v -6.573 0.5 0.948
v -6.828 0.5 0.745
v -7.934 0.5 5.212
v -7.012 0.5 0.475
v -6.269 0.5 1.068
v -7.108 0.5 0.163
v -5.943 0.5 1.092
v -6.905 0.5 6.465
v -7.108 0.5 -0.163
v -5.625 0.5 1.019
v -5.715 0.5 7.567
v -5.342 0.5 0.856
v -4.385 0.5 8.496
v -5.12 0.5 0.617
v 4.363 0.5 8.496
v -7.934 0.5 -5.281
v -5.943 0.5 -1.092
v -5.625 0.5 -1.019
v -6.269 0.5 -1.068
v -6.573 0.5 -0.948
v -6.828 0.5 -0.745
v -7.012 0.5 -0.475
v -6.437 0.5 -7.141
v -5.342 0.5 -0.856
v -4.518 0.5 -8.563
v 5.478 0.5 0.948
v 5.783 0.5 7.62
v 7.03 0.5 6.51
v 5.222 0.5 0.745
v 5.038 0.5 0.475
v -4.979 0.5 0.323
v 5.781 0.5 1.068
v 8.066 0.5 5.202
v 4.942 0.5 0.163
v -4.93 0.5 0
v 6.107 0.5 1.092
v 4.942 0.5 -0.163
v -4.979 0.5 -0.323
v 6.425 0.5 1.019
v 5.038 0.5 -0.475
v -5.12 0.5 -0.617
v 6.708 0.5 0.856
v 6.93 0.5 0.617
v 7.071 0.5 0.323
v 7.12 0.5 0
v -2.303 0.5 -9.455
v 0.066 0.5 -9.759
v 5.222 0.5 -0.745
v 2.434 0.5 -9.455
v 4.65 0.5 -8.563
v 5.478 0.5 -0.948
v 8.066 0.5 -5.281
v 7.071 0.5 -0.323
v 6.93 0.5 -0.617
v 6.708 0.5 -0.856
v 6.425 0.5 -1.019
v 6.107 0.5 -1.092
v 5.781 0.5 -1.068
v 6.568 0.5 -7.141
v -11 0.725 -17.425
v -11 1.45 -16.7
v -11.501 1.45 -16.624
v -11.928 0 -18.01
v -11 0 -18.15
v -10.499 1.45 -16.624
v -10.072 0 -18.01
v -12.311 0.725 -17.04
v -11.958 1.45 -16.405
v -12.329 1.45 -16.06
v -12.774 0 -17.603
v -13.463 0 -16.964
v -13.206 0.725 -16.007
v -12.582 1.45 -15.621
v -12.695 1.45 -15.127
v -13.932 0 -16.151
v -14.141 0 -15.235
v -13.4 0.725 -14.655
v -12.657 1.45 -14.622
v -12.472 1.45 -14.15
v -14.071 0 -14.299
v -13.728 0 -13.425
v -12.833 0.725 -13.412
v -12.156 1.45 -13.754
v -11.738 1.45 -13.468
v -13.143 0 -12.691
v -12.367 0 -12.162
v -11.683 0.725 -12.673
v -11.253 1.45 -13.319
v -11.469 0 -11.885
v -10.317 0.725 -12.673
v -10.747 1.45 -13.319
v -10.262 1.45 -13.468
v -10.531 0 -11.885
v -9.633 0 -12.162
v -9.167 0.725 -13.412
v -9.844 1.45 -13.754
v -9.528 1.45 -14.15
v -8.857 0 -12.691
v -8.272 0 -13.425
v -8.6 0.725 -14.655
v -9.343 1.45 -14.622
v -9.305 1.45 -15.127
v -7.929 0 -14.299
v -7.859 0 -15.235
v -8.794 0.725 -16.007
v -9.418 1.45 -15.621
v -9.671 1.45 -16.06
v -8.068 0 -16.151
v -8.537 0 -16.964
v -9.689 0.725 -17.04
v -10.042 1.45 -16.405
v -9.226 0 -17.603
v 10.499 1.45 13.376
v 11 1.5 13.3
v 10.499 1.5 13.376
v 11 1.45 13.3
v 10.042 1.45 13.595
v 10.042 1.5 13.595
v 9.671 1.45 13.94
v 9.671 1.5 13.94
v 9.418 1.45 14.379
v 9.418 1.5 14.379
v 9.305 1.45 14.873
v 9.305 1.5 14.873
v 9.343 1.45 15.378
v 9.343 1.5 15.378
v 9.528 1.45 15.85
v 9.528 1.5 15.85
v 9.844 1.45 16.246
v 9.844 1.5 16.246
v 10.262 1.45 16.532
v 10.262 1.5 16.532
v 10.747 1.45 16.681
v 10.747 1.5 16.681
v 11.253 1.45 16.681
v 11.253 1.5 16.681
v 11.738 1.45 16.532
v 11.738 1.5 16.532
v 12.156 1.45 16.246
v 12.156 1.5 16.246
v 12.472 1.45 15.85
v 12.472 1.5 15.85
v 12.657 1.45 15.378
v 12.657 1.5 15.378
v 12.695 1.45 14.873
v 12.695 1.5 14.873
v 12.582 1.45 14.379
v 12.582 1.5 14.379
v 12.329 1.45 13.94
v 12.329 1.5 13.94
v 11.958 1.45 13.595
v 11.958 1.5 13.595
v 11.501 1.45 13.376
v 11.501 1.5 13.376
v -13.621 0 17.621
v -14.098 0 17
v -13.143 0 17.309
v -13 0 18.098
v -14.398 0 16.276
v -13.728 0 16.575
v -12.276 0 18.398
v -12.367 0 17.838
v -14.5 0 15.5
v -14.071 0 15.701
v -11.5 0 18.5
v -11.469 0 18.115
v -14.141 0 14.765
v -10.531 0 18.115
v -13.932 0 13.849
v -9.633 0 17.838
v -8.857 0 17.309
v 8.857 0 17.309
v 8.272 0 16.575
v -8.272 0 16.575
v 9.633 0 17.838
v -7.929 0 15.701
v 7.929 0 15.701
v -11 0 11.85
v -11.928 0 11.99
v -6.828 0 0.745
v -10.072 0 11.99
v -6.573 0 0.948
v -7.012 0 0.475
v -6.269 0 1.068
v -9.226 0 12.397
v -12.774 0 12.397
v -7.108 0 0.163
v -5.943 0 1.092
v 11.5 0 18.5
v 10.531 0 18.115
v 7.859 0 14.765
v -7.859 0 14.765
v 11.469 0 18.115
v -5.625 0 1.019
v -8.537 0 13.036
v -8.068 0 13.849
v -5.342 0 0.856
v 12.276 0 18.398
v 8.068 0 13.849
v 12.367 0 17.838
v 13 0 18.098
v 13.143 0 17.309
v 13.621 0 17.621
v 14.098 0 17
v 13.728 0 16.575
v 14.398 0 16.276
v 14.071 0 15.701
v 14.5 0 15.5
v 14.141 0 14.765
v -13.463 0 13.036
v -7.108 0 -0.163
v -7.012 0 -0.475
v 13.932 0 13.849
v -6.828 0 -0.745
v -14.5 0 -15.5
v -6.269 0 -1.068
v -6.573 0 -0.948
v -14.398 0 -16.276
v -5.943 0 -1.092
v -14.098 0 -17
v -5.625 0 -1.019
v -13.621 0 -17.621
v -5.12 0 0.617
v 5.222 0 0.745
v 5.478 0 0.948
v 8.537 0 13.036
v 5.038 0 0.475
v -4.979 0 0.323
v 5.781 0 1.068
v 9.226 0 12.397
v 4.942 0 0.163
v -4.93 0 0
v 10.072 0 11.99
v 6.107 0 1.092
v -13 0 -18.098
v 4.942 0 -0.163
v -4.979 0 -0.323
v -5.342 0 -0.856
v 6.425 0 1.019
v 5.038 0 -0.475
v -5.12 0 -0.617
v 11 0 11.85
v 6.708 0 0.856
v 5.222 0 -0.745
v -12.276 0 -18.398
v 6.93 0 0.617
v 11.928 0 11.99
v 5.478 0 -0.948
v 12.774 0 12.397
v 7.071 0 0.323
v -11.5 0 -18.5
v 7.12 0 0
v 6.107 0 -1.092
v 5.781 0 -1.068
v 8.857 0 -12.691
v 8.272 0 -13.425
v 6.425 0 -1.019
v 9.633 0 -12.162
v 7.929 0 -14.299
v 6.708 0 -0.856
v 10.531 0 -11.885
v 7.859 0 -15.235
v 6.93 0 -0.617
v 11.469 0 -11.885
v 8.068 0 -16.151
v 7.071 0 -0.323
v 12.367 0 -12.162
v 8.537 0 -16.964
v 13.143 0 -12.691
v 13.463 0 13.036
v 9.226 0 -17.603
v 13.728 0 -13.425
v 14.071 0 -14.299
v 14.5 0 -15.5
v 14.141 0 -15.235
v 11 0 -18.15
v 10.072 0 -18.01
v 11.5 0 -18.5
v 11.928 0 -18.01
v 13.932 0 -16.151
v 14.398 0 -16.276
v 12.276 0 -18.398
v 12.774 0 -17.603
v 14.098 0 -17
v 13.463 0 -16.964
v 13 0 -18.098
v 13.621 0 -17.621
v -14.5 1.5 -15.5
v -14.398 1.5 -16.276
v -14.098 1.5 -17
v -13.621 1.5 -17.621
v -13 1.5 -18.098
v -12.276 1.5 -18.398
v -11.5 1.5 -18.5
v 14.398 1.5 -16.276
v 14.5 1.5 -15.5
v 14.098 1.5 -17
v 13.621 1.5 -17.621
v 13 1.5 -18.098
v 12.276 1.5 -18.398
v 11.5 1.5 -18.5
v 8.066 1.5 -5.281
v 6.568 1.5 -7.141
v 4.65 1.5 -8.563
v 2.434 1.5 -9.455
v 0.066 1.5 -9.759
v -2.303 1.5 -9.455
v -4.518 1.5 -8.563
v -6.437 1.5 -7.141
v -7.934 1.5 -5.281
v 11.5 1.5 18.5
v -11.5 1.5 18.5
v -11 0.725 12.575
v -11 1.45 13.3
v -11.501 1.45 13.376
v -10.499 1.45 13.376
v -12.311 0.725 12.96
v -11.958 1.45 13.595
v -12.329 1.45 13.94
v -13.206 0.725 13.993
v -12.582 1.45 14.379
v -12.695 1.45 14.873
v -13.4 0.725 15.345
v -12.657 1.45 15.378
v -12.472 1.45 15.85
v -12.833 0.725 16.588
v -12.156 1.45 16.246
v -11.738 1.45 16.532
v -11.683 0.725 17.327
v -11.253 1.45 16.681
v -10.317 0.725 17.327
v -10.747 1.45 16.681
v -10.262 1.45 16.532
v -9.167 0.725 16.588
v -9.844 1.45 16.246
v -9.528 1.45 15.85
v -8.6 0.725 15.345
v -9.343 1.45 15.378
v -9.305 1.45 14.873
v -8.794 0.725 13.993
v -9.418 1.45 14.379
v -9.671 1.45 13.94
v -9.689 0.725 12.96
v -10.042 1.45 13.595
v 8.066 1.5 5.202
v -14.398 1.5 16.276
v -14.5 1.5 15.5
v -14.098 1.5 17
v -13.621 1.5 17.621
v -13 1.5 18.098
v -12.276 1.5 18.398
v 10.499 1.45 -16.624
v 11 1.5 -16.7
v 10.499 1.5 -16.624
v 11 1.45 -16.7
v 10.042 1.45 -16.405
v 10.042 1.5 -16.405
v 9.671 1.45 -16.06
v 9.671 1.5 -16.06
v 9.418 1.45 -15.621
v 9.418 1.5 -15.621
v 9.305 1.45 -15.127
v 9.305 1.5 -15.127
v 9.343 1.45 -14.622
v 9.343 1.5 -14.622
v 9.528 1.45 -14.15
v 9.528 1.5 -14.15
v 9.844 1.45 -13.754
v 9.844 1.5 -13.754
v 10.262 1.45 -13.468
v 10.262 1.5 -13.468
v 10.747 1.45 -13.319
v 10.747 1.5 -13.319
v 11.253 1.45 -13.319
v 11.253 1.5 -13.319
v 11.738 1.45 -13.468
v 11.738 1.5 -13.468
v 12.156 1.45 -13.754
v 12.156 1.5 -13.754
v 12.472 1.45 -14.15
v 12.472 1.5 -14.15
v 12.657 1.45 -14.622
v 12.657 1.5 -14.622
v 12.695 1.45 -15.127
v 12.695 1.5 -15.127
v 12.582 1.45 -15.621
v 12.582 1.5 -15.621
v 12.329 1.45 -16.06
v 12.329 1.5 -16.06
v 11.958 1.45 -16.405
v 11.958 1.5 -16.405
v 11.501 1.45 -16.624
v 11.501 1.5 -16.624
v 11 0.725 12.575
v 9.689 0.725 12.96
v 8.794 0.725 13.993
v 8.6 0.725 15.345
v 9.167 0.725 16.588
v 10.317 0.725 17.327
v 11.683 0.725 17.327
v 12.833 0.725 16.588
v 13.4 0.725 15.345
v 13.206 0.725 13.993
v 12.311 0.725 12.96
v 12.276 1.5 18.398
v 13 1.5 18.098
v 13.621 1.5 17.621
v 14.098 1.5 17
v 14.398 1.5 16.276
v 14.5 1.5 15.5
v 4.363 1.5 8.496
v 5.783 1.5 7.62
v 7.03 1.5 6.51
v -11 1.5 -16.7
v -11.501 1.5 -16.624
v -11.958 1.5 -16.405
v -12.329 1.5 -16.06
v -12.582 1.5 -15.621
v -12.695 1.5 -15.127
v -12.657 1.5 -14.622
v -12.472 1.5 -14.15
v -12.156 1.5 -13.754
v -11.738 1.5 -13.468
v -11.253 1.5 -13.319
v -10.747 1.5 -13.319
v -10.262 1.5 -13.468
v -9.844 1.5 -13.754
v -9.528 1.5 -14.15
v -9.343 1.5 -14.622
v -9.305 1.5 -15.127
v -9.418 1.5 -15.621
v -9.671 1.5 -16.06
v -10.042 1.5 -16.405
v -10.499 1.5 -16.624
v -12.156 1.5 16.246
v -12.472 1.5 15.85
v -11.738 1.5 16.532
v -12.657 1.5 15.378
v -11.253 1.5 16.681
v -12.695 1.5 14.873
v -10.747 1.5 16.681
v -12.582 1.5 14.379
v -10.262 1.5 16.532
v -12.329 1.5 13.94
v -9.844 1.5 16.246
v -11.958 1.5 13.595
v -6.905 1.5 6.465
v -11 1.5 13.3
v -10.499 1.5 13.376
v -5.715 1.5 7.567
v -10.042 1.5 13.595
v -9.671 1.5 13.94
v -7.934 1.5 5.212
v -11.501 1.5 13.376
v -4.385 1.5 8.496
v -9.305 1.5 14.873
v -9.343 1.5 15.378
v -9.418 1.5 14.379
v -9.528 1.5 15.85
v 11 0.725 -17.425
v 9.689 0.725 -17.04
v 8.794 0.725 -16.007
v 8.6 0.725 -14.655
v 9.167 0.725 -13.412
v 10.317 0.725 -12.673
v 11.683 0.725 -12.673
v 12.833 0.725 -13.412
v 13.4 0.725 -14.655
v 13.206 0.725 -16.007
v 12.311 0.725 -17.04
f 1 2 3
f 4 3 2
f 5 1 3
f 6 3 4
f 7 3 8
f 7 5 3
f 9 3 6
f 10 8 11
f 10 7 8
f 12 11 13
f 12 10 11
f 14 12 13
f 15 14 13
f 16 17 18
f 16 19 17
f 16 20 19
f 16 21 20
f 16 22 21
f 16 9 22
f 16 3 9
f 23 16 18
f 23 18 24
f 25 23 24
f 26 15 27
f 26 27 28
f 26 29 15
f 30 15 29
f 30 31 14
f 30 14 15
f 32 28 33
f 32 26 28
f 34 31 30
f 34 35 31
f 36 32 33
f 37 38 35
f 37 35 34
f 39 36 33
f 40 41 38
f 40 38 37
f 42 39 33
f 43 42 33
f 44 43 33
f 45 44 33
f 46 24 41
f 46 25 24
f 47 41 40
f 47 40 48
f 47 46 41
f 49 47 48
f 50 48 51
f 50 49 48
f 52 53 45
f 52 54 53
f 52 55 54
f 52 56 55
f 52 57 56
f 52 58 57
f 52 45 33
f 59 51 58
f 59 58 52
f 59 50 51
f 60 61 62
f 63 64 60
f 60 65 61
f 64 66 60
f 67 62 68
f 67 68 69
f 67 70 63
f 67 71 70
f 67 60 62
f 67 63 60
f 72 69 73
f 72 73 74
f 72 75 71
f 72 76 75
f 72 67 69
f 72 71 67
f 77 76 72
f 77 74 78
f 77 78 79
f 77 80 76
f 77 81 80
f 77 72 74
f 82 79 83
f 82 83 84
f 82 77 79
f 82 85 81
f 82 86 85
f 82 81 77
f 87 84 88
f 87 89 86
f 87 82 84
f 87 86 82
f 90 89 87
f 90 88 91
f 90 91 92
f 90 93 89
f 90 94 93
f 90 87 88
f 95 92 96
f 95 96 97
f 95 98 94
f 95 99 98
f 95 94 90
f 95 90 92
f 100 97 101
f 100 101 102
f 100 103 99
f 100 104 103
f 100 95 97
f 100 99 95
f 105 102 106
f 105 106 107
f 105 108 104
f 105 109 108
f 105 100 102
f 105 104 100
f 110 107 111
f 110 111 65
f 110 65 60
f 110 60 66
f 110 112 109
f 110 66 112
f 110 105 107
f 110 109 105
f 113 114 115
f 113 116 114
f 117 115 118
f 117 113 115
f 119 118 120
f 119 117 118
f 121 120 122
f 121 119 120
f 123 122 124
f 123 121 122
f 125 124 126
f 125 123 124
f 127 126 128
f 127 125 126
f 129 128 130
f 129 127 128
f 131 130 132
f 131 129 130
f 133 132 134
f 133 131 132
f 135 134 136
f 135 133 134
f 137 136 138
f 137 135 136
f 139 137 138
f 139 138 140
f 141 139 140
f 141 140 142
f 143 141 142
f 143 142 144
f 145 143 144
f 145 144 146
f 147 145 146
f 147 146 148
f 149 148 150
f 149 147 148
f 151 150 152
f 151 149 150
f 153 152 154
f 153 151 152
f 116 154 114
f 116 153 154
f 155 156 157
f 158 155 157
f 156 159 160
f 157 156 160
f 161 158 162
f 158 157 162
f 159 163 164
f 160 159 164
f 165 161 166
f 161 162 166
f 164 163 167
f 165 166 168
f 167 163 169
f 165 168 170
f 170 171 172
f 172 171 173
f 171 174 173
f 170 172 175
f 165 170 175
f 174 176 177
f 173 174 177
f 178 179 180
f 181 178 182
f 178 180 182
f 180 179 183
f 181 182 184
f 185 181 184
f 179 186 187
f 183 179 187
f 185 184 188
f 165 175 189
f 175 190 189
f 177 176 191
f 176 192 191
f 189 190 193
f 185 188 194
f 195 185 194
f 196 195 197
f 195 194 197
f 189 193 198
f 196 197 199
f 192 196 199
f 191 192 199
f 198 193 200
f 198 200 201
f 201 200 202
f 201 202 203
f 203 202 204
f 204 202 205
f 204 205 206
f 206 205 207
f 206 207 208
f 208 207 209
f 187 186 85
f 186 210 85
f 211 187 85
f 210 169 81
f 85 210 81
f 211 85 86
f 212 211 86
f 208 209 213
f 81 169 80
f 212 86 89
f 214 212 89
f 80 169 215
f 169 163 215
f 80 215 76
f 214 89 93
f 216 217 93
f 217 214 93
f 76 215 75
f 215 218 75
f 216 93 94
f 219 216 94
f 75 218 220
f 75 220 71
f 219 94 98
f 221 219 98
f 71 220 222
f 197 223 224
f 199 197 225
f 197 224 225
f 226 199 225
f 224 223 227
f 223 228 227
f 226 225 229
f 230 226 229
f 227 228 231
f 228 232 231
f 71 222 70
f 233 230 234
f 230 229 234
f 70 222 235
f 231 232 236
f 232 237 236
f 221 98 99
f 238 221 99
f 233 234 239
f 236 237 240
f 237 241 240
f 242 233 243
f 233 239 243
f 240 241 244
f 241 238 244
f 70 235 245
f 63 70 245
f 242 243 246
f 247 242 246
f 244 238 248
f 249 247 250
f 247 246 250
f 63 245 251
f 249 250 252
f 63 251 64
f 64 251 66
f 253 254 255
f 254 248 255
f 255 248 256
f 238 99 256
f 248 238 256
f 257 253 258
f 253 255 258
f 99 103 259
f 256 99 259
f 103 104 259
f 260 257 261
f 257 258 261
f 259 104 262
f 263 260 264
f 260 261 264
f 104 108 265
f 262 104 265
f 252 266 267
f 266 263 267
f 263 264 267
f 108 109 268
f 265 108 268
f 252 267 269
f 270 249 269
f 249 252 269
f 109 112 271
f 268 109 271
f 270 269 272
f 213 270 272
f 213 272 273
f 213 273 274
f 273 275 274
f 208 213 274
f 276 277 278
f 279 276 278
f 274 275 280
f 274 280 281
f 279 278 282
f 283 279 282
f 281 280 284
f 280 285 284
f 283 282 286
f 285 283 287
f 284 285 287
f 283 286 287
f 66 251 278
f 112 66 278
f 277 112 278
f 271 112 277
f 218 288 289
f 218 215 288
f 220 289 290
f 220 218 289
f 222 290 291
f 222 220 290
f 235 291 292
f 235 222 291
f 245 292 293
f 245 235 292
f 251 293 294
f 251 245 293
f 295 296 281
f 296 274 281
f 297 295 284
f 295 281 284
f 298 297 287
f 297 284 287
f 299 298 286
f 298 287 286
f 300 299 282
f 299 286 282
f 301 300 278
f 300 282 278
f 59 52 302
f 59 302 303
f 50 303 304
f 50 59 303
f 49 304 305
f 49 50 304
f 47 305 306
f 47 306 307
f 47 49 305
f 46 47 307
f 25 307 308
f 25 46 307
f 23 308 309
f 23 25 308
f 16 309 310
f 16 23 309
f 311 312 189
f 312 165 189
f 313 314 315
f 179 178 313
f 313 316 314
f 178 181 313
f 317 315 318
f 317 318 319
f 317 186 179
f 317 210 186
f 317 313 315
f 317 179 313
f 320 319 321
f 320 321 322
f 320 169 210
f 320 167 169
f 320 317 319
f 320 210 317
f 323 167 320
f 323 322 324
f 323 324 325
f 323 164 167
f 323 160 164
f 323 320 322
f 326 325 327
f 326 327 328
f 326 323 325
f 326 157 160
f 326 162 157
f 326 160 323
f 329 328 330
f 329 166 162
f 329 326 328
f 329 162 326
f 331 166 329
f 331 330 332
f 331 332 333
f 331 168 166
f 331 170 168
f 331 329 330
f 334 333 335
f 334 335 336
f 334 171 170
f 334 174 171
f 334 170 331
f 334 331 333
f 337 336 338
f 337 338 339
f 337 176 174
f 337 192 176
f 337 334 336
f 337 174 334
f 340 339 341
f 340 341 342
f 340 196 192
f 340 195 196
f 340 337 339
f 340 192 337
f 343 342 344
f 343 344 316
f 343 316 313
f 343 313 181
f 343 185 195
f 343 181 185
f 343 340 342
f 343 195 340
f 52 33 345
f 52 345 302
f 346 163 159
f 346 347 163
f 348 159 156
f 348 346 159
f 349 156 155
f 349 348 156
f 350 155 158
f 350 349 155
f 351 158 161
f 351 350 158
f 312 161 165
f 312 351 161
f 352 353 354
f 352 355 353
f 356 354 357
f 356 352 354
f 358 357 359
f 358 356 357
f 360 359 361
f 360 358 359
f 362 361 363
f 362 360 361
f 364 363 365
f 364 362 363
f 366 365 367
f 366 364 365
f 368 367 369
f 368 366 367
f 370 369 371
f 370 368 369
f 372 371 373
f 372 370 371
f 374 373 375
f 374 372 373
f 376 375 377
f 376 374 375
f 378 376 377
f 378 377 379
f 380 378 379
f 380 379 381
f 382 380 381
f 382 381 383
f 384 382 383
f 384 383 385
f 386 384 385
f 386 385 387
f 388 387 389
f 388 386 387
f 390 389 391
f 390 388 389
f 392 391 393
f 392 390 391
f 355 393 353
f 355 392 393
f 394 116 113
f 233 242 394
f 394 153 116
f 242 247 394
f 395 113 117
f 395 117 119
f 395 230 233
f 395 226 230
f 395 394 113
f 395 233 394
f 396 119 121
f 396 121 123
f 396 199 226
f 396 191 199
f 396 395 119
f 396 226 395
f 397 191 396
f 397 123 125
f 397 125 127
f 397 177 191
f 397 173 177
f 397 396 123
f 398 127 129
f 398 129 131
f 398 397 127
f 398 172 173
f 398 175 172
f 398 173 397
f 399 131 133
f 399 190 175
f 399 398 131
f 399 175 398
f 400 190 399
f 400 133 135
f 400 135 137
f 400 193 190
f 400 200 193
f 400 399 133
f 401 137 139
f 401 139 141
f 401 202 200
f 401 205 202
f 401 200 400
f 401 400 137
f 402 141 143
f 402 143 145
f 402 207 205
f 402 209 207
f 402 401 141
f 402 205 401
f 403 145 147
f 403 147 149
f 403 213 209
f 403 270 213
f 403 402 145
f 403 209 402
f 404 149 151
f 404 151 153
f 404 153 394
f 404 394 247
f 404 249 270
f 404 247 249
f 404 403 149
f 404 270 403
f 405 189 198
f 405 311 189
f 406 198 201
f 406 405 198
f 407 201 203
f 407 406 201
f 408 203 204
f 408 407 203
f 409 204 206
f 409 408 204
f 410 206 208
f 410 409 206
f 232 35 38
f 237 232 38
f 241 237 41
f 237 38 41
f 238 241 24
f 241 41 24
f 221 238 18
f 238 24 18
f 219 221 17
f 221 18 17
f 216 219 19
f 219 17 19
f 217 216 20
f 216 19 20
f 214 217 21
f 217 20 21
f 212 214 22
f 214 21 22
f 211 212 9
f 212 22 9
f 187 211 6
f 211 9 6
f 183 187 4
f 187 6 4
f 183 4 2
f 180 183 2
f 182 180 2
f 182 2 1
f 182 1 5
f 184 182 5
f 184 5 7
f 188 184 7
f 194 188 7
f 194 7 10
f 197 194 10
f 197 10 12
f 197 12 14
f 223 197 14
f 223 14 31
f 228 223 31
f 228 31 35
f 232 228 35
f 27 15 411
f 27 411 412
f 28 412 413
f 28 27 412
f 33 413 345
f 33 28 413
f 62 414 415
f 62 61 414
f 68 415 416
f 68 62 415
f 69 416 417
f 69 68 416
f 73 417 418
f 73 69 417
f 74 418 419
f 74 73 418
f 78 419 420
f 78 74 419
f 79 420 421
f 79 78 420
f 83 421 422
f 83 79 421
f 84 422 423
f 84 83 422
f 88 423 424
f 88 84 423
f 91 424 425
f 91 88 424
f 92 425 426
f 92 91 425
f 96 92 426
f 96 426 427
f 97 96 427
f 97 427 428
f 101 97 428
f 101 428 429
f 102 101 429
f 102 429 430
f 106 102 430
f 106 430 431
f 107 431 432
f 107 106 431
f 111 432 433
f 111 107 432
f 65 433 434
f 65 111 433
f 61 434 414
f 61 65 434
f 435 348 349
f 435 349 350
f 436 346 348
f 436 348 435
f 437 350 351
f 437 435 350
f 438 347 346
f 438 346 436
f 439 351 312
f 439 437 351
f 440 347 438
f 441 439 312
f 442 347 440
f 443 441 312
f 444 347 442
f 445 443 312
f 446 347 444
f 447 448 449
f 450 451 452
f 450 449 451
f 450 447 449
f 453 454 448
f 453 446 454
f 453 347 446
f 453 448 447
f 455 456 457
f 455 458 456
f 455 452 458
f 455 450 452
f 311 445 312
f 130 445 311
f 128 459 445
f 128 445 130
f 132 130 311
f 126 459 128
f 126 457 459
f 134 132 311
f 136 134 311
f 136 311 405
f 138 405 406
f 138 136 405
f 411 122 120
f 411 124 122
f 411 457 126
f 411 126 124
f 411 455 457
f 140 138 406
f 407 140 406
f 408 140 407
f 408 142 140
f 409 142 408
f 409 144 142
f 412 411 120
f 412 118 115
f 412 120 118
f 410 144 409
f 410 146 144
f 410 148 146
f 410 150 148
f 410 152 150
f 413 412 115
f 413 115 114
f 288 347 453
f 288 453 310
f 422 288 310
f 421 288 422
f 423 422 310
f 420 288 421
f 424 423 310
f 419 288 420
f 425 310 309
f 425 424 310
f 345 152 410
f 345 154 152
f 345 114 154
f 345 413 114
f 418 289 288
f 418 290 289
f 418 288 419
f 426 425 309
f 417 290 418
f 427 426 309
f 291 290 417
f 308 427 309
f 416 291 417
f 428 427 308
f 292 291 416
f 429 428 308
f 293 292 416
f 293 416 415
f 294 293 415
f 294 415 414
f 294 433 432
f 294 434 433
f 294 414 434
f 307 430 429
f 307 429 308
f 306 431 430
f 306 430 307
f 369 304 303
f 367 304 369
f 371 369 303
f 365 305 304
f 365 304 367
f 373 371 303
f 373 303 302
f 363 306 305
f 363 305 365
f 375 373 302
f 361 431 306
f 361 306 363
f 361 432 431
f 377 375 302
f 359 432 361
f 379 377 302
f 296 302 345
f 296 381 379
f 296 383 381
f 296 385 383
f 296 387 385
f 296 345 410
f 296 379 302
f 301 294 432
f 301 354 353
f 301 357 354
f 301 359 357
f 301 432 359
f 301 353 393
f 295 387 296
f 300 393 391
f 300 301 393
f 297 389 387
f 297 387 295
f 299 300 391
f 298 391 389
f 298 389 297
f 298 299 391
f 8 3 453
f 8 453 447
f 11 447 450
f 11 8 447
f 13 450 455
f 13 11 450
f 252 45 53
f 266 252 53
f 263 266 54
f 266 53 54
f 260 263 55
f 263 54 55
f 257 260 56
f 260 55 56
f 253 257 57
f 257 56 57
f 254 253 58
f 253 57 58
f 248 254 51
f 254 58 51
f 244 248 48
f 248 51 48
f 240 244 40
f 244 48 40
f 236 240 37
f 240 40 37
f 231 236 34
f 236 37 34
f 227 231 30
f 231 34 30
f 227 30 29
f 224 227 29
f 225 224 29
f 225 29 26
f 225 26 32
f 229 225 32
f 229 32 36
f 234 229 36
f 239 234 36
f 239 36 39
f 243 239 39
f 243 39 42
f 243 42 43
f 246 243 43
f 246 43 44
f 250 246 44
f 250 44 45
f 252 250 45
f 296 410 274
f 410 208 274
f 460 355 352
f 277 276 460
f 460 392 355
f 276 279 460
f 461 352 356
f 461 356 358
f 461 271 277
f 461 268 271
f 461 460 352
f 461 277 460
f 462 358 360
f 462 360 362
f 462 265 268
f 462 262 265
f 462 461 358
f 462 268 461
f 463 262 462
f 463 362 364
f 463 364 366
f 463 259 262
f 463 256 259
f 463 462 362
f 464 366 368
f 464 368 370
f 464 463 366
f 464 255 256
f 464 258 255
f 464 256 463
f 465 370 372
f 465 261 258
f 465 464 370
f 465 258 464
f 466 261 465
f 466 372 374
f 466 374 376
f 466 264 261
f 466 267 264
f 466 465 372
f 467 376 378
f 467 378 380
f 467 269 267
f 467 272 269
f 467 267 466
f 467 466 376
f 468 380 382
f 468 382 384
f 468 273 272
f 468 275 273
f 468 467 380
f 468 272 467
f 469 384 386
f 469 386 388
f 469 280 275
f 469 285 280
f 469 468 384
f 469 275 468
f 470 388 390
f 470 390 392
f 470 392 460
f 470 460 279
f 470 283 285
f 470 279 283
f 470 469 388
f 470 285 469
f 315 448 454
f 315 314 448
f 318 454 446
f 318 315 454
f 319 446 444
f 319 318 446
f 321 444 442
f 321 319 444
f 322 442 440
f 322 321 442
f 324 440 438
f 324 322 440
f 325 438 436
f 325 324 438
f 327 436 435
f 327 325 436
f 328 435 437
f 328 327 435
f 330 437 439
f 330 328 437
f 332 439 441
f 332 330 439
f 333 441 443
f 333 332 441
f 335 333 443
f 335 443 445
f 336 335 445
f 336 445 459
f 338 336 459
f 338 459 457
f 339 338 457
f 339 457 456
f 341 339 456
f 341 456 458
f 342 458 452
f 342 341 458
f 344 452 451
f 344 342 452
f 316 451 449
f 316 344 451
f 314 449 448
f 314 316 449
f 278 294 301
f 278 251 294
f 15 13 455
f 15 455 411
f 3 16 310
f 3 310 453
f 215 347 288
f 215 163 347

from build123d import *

# Parameters (mm, degrees)
SKETCH5_W                                    = 29
SKETCH5_H                                    = 37
BOSS_EXTRUDE3_DEPTH                          = 0.5
SKETCH6_R                                    = 1.095
CUT_EXTRUDE1_DEPTH                           = 1
CUT_EXTRUDE1_DEPTH_BACK                      = 1.5
SKETCH7_W                                    = 29
SKETCH7_H                                    = 37
BOSS_EXTRUDE4_DEPTH                          = 1
FILLET1_R                                    = 3
CSK_FOR_M3_COUNTERSUNK_FLAT_HEAD_SCR_2_COUNT = 2
CSK_FOR_M3_COUNTERSUNK_FLAT_HEAD_SCR_2_PITCH = 22
CSK_FOR_M3_COUNTERSUNK_FLAT_HEAD_SCR_3_COUNT = 2
CSK_FOR_M3_COUNTERSUNK_FLAT_HEAD_SCR_3_PITCH = 37.202150475
CSK_FOR_M3_COUNTERSUNK_FLAT_HEAD_SCR_4_COUNT = 2
CSK_FOR_M3_COUNTERSUNK_FLAT_HEAD_SCR_4_PITCH = 30


with BuildPart() as part:
    # Sketch5 → Boss-Extrude3 (new body)
    with BuildSketch(Plane(origin=(0, 0, 0), x_dir=(1, 0, 0), z_dir=(0, 1, 0))):
        Rectangle(SKETCH5_W, SKETCH5_H)
    extrude(amount=BOSS_EXTRUDE3_DEPTH)

    # Sketch6 → Cut-Extrude1 (cut, two sides)
    with BuildSketch(Plane(origin=(0, 0.5, 0), x_dir=(1, 0, 0), z_dir=(0, 1, 0))) as cut_extrude1_sk:
        with Locations((-6.025, 0)):
            Circle(SKETCH6_R)
        with Locations((6.025, 0)):
            Circle(SKETCH6_R)
    extrude(amount=CUT_EXTRUDE1_DEPTH, mode=Mode.SUBTRACT)
    extrude(cut_extrude1_sk.sketch, amount=-CUT_EXTRUDE1_DEPTH_BACK, mode=Mode.SUBTRACT)

    # Sketch7 → Boss-Extrude4 (add)
    with BuildSketch(Plane(origin=(0, 0.5, 0), x_dir=(1, 0, 0), z_dir=(0, 1, 0))):
        Rectangle(SKETCH7_W, SKETCH7_H)
        with BuildLine():
            ThreePointArc((4.362935735, -8.496468579), (6.43071599, -7.092318659), (8.065752838, -5.201814312))
            Line((8.065752838, -5.201814312), (8.065752838, 5.280856896))
            ThreePointArc((8.065752838, 5.280856896), (0.065752838, 9.758587375), (-7.934247162, 5.280856896))
            Line((-7.934247162, 5.280856896), (-7.934247162, -5.211512098))
            ThreePointArc((-7.934247162, -5.211512098), (-6.328814647, -7.036583971), (-4.385354374, -8.496468579))
            Line((-4.385354374, -8.496468579), (4.362935735, -8.496468579))
        make_face(mode=Mode.SUBTRACT)
    extrude(amount=BOSS_EXTRUDE4_DEPTH)

    # Fillet1
    fillet1_edges = [part.edges().sort_by_distance(p)[0] for p in [
        (-14.5, 0.75, -18.5),
        (14.5, 0.75, -18.5),
        (14.5, 0.75, 18.5),
        (-14.5, 0.75, 18.5),
    ]]
    fillet(fillet1_edges, radius=FILLET1_R)

    # Sketch11 → CSK for M3 Countersunk Flat Head Screw1 (revolve, cut)
    with BuildSketch(Plane(origin=(-11, 0, -15), x_dir=(0, 0, -1), z_dir=(1, 0, 0))):
        Polygon((0, 0), (0, 1.5), (1.7, 1.5), (1.7, 1.45), (3.15, 0), align=None)
    csk_for_m3_countersunk_flat_head_screw1 = revolve(axis=Axis((-11, -6.35, -15), (0, 1, 0)), mode=Mode.SUBTRACT)

    # CSK for M3 Countersunk Flat Head Scr 2: CSK for M3 Countersunk Flat Head Screw1 ×2
    with Locations(*[(i * CSK_FOR_M3_COUNTERSUNK_FLAT_HEAD_SCR_2_PITCH, 0, 0) for i in range(1, CSK_FOR_M3_COUNTERSUNK_FLAT_HEAD_SCR_2_COUNT)]):
        add(csk_for_m3_countersunk_flat_head_screw1, mode=Mode.SUBTRACT)

    # CSK for M3 Countersunk Flat Head Scr 3: CSK for M3 Countersunk Flat Head Screw1 ×2
    with Locations(*[Vector(0.591363664, 0, 0.806404996) * (i * CSK_FOR_M3_COUNTERSUNK_FLAT_HEAD_SCR_3_PITCH) for i in range(1, CSK_FOR_M3_COUNTERSUNK_FLAT_HEAD_SCR_3_COUNT)]):
        add(csk_for_m3_countersunk_flat_head_screw1, mode=Mode.SUBTRACT)

    # CSK for M3 Countersunk Flat Head Scr 4: CSK for M3 Countersunk Flat Head Screw1 ×2
    with Locations(*[(0, 0, i * CSK_FOR_M3_COUNTERSUNK_FLAT_HEAD_SCR_4_PITCH) for i in range(1, CSK_FOR_M3_COUNTERSUNK_FLAT_HEAD_SCR_4_COUNT)]):
        add(csk_for_m3_countersunk_flat_head_screw1, mode=Mode.SUBTRACT)


solid = part.part
